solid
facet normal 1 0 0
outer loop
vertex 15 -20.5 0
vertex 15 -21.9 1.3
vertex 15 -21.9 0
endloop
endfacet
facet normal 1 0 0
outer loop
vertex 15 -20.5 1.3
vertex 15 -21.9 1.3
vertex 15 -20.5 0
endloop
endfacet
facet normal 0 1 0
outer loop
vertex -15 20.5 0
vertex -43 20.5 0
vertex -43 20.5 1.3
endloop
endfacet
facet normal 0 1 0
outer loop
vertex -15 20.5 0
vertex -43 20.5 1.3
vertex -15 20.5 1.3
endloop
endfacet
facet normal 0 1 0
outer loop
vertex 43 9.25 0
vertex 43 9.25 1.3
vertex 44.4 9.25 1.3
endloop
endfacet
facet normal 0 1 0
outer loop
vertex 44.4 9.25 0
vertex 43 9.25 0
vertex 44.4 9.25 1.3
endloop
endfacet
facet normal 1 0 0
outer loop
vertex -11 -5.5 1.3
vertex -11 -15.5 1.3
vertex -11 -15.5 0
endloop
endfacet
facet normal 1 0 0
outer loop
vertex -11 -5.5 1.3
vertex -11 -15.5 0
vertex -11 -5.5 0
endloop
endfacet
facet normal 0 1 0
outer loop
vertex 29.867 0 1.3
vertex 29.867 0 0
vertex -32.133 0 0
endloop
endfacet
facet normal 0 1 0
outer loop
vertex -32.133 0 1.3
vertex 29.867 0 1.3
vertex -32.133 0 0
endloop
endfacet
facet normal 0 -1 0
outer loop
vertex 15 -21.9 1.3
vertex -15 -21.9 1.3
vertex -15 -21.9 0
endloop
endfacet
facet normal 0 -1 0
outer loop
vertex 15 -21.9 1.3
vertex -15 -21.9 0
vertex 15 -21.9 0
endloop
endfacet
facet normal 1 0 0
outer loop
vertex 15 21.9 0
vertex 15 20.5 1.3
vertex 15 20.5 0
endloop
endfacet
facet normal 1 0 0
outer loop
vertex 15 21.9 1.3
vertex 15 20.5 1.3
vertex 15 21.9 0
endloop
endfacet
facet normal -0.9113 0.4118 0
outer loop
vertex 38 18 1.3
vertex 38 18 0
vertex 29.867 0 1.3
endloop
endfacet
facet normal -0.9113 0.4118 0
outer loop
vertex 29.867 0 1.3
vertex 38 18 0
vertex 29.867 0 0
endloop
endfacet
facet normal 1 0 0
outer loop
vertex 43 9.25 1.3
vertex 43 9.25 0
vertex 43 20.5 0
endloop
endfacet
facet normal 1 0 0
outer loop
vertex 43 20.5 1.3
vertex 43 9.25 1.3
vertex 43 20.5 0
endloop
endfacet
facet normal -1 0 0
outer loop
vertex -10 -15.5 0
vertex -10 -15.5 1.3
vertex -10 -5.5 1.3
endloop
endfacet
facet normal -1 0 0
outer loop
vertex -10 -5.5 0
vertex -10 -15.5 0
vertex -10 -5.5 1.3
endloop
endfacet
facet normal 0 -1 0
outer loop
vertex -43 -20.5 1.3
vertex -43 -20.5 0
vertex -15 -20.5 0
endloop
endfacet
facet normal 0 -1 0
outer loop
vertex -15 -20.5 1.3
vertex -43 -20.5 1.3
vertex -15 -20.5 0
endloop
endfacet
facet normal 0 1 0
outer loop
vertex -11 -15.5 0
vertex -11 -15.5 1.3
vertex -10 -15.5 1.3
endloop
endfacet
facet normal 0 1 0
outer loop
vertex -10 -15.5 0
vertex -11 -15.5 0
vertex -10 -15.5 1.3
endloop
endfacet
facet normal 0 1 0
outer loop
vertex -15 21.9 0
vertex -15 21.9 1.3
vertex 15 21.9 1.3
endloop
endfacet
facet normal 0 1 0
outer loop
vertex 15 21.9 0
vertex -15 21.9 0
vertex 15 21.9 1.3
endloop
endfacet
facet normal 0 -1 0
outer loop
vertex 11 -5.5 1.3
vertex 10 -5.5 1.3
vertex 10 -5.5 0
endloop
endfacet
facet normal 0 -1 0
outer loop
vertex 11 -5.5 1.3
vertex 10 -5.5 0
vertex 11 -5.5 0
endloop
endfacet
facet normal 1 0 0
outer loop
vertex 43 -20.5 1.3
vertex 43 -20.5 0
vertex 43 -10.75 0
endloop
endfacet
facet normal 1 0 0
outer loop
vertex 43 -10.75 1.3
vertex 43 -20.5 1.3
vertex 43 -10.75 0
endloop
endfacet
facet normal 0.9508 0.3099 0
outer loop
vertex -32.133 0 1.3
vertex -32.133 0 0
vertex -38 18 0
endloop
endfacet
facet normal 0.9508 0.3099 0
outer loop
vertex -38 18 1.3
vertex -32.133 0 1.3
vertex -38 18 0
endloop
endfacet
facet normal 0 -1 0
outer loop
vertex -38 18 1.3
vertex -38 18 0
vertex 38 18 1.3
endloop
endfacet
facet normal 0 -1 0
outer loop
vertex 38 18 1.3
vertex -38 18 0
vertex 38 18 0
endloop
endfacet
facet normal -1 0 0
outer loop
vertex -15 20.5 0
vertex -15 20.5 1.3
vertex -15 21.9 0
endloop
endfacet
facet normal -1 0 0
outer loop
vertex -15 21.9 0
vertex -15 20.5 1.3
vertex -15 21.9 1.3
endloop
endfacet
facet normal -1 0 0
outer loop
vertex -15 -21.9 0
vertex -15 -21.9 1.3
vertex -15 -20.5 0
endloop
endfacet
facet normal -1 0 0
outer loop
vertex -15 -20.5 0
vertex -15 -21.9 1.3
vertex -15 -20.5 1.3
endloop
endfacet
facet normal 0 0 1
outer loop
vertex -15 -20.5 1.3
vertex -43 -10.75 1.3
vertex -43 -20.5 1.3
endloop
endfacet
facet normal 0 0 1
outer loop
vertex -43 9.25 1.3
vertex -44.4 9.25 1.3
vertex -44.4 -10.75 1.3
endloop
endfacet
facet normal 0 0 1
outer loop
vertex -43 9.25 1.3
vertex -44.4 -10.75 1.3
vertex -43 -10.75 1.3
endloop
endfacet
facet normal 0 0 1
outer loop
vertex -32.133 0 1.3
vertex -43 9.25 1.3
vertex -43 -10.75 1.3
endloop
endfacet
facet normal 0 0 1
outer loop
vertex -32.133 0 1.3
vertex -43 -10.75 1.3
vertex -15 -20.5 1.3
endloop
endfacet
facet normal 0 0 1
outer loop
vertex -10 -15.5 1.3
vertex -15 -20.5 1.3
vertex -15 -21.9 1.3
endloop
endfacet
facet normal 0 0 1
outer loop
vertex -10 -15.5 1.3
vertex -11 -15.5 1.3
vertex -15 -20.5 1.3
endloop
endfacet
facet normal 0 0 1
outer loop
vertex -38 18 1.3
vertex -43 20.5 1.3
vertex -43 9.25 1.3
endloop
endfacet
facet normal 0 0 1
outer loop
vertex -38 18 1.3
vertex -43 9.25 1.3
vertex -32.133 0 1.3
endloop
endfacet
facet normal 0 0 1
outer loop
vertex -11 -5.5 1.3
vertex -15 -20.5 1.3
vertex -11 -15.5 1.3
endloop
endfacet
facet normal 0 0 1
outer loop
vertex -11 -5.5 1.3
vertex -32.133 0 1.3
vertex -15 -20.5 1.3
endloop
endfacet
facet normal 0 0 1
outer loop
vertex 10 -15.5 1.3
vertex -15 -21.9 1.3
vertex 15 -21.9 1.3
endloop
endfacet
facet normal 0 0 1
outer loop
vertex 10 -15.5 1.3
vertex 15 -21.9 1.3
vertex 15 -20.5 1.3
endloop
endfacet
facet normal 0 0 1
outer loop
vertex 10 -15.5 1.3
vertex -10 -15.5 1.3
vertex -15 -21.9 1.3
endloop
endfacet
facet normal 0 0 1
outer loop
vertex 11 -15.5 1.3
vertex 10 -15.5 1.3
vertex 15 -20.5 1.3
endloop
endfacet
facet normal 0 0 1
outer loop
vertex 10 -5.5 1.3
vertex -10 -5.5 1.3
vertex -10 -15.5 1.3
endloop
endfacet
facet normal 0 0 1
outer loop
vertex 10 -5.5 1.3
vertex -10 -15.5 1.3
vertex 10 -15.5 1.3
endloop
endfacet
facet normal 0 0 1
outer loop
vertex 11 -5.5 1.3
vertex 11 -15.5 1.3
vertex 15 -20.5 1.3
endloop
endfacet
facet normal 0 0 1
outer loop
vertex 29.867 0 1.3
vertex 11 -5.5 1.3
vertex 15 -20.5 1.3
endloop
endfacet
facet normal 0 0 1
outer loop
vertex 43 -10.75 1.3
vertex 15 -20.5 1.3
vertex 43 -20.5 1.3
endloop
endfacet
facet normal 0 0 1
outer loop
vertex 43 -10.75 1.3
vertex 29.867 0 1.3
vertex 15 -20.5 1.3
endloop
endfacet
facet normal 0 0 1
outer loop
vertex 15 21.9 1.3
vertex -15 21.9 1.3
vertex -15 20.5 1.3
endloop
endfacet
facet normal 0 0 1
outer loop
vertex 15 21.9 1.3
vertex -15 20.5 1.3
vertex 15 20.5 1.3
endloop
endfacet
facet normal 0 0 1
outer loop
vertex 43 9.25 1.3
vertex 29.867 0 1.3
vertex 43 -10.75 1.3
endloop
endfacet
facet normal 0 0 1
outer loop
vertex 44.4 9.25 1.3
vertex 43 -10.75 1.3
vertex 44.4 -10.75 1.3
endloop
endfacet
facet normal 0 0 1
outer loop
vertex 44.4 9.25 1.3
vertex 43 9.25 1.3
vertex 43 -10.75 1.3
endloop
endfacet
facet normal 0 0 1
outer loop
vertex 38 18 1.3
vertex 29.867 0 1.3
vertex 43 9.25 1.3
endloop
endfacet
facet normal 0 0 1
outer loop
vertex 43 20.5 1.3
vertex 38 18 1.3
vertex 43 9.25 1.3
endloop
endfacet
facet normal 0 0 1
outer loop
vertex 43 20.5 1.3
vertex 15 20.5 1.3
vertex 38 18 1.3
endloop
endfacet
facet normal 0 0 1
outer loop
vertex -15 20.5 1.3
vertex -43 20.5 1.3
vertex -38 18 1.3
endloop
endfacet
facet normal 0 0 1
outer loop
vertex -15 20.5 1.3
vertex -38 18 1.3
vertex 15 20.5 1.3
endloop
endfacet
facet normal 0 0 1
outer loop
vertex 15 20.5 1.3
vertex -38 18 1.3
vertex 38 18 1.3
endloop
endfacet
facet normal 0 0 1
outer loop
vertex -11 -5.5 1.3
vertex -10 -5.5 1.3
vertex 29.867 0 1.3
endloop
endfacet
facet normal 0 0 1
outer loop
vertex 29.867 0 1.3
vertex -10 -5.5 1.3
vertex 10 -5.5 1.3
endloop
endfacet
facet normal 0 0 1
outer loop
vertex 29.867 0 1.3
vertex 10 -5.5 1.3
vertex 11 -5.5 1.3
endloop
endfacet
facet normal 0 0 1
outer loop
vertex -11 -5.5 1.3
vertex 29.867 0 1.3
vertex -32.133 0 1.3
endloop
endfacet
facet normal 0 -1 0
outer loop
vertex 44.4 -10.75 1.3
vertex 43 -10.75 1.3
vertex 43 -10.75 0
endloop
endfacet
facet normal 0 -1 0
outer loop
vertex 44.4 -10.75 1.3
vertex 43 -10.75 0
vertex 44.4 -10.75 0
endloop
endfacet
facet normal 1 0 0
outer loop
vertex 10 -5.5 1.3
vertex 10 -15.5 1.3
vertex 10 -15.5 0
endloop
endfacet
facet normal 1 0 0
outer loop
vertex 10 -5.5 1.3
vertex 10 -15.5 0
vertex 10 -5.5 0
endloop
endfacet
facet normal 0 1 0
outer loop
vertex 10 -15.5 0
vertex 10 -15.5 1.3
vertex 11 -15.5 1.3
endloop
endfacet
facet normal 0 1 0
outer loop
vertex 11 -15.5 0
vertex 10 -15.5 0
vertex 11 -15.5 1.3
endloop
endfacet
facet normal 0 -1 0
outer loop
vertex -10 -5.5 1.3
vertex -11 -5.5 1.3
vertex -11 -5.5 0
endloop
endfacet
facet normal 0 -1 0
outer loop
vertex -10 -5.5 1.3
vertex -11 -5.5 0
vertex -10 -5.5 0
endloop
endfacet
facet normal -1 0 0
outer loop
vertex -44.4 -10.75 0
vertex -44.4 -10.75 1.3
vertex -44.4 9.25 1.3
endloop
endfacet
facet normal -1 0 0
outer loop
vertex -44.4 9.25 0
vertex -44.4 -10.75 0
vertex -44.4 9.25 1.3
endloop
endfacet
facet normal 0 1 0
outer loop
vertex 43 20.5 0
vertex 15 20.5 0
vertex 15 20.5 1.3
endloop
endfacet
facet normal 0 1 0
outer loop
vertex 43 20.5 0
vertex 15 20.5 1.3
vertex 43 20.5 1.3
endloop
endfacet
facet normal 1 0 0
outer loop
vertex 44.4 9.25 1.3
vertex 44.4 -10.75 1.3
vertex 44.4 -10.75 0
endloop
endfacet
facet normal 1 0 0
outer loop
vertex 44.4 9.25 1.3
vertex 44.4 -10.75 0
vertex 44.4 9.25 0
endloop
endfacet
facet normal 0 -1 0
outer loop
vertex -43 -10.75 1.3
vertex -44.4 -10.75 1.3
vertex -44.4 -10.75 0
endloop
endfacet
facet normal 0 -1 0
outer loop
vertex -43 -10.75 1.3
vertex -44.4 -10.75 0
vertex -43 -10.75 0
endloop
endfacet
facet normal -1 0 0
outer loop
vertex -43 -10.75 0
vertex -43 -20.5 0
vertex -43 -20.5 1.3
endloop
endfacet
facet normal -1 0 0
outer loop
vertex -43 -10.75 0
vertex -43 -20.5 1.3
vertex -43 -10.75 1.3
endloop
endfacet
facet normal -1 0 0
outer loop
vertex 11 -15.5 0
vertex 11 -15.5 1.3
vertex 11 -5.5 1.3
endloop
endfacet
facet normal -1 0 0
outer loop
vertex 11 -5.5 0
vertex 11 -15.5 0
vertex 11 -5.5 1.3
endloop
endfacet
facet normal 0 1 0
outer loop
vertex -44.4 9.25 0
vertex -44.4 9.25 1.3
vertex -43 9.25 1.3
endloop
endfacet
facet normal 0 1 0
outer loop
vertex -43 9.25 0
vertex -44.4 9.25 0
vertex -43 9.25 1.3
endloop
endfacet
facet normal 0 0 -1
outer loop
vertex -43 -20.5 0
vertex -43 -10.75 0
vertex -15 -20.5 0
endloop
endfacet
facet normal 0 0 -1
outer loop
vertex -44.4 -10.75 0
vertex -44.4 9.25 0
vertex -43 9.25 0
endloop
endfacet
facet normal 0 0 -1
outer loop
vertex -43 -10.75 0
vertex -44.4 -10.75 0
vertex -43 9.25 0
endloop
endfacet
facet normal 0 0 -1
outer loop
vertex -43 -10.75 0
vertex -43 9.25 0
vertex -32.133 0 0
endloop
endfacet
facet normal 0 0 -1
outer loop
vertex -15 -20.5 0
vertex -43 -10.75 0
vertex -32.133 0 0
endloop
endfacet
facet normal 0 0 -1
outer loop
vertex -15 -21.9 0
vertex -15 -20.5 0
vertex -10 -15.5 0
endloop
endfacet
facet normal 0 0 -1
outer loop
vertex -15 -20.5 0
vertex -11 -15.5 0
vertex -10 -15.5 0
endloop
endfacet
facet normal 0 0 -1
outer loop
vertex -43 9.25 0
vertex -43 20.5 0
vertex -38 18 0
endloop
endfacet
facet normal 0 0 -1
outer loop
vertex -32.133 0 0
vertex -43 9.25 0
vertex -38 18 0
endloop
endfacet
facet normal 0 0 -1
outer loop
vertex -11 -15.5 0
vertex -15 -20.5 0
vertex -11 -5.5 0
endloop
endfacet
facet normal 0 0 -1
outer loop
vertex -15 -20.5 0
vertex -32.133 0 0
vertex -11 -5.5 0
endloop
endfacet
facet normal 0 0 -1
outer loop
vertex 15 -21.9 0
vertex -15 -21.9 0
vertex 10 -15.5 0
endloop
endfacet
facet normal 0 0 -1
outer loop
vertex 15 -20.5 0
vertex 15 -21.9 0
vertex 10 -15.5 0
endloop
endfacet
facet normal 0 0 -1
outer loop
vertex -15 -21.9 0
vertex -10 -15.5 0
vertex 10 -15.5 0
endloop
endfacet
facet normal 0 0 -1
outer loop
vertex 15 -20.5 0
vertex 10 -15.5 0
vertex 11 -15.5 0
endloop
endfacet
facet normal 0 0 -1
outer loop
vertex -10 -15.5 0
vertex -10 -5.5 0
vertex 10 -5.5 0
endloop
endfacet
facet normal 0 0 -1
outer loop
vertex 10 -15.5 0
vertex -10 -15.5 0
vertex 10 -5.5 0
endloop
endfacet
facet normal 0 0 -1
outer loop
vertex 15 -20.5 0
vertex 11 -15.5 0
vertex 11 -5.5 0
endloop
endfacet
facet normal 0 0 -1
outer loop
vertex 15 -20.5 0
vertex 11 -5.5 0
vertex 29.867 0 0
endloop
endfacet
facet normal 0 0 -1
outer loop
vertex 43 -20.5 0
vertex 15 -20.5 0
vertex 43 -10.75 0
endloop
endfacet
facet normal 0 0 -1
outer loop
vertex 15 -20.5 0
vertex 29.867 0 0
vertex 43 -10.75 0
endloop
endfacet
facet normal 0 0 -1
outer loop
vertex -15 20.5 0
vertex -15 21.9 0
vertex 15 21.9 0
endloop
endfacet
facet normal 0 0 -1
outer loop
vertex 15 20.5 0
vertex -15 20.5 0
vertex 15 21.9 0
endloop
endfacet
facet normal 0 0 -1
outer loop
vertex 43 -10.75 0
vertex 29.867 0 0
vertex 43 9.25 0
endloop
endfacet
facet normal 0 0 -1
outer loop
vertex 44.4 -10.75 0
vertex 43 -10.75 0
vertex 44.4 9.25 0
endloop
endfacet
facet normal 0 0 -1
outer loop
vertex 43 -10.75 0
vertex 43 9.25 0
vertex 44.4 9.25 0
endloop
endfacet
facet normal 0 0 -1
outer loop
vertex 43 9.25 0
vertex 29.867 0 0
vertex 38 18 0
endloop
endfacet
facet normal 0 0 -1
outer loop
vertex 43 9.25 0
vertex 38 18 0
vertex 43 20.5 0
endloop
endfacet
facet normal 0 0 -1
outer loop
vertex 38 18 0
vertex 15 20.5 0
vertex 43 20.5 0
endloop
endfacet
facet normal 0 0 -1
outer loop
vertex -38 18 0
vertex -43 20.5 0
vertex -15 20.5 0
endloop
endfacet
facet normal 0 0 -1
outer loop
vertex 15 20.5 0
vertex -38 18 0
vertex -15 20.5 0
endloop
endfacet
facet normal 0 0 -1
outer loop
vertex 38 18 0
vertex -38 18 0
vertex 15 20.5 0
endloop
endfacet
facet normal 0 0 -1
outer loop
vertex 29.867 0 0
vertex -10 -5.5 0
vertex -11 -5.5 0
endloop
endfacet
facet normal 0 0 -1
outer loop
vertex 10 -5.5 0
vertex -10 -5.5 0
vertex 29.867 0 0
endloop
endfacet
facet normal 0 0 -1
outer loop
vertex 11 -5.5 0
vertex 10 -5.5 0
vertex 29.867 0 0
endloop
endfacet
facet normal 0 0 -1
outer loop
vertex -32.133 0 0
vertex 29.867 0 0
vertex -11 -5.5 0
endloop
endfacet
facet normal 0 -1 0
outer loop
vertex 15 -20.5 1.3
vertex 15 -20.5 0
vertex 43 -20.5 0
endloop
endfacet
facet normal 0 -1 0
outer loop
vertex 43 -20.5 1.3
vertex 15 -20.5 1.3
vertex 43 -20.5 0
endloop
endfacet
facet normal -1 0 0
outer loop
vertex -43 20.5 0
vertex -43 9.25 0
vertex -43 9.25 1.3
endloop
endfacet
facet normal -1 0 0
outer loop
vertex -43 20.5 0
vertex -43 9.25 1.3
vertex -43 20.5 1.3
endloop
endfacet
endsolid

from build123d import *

# Parameters (mm, degrees)
SKETCH1_W           = 86
SKETCH1_H           = 41
BOSS_EXTRUDE1_DEPTH = 1.3
SKETCH2_W           = 1.4
SKETCH2_H           = 20
SKETCH2_W_2         = 30
SKETCH2_H_2         = 1.4
BOSS_EXTRUDE2_DEPTH = 1.3
SKETCH3_W           = 1
SKETCH3_H           = 10
CUT_EXTRUDE1_DEPTH  = 50.524337451


with BuildPart() as part:
    # Sketch1 → Boss-Extrude1 (new body)
    with BuildSketch(Plane.XY):
        Rectangle(SKETCH1_W, SKETCH1_H)
        Polygon((-38, 18), (38, 18), (29.867102397, 0), (-32.132897603, 0), align=None, mode=Mode.SUBTRACT)
    extrude(amount=BOSS_EXTRUDE1_DEPTH)

    # Sketch2 → Boss-Extrude2 (add)
    with BuildSketch(Plane.XY.offset(1.3)):
        with Locations((-43.7, -0.75)):
            Rectangle(SKETCH2_W, SKETCH2_H)
        with Locations((43.7, -0.75)):
            Rectangle(SKETCH2_W, SKETCH2_H)
        with Locations((0, 21.2)):
            Rectangle(SKETCH2_W_2, SKETCH2_H_2)
        with Locations((0, -21.2)):
            Rectangle(SKETCH2_W_2, SKETCH2_H_2)
    extrude(amount=-BOSS_EXTRUDE2_DEPTH)

    # Sketch3 → Cut-Extrude1 (cut, through all)
    with BuildSketch(Plane.XY.offset(1.3)):
        with Locations((-10.5, -10.5)):
            Rectangle(SKETCH3_W, SKETCH3_H)
        with Locations((10.5, -10.5)):
            Rectangle(SKETCH3_W, SKETCH3_H)
    extrude(amount=-CUT_EXTRUDE1_DEPTH, mode=Mode.SUBTRACT)


solid = part.part
